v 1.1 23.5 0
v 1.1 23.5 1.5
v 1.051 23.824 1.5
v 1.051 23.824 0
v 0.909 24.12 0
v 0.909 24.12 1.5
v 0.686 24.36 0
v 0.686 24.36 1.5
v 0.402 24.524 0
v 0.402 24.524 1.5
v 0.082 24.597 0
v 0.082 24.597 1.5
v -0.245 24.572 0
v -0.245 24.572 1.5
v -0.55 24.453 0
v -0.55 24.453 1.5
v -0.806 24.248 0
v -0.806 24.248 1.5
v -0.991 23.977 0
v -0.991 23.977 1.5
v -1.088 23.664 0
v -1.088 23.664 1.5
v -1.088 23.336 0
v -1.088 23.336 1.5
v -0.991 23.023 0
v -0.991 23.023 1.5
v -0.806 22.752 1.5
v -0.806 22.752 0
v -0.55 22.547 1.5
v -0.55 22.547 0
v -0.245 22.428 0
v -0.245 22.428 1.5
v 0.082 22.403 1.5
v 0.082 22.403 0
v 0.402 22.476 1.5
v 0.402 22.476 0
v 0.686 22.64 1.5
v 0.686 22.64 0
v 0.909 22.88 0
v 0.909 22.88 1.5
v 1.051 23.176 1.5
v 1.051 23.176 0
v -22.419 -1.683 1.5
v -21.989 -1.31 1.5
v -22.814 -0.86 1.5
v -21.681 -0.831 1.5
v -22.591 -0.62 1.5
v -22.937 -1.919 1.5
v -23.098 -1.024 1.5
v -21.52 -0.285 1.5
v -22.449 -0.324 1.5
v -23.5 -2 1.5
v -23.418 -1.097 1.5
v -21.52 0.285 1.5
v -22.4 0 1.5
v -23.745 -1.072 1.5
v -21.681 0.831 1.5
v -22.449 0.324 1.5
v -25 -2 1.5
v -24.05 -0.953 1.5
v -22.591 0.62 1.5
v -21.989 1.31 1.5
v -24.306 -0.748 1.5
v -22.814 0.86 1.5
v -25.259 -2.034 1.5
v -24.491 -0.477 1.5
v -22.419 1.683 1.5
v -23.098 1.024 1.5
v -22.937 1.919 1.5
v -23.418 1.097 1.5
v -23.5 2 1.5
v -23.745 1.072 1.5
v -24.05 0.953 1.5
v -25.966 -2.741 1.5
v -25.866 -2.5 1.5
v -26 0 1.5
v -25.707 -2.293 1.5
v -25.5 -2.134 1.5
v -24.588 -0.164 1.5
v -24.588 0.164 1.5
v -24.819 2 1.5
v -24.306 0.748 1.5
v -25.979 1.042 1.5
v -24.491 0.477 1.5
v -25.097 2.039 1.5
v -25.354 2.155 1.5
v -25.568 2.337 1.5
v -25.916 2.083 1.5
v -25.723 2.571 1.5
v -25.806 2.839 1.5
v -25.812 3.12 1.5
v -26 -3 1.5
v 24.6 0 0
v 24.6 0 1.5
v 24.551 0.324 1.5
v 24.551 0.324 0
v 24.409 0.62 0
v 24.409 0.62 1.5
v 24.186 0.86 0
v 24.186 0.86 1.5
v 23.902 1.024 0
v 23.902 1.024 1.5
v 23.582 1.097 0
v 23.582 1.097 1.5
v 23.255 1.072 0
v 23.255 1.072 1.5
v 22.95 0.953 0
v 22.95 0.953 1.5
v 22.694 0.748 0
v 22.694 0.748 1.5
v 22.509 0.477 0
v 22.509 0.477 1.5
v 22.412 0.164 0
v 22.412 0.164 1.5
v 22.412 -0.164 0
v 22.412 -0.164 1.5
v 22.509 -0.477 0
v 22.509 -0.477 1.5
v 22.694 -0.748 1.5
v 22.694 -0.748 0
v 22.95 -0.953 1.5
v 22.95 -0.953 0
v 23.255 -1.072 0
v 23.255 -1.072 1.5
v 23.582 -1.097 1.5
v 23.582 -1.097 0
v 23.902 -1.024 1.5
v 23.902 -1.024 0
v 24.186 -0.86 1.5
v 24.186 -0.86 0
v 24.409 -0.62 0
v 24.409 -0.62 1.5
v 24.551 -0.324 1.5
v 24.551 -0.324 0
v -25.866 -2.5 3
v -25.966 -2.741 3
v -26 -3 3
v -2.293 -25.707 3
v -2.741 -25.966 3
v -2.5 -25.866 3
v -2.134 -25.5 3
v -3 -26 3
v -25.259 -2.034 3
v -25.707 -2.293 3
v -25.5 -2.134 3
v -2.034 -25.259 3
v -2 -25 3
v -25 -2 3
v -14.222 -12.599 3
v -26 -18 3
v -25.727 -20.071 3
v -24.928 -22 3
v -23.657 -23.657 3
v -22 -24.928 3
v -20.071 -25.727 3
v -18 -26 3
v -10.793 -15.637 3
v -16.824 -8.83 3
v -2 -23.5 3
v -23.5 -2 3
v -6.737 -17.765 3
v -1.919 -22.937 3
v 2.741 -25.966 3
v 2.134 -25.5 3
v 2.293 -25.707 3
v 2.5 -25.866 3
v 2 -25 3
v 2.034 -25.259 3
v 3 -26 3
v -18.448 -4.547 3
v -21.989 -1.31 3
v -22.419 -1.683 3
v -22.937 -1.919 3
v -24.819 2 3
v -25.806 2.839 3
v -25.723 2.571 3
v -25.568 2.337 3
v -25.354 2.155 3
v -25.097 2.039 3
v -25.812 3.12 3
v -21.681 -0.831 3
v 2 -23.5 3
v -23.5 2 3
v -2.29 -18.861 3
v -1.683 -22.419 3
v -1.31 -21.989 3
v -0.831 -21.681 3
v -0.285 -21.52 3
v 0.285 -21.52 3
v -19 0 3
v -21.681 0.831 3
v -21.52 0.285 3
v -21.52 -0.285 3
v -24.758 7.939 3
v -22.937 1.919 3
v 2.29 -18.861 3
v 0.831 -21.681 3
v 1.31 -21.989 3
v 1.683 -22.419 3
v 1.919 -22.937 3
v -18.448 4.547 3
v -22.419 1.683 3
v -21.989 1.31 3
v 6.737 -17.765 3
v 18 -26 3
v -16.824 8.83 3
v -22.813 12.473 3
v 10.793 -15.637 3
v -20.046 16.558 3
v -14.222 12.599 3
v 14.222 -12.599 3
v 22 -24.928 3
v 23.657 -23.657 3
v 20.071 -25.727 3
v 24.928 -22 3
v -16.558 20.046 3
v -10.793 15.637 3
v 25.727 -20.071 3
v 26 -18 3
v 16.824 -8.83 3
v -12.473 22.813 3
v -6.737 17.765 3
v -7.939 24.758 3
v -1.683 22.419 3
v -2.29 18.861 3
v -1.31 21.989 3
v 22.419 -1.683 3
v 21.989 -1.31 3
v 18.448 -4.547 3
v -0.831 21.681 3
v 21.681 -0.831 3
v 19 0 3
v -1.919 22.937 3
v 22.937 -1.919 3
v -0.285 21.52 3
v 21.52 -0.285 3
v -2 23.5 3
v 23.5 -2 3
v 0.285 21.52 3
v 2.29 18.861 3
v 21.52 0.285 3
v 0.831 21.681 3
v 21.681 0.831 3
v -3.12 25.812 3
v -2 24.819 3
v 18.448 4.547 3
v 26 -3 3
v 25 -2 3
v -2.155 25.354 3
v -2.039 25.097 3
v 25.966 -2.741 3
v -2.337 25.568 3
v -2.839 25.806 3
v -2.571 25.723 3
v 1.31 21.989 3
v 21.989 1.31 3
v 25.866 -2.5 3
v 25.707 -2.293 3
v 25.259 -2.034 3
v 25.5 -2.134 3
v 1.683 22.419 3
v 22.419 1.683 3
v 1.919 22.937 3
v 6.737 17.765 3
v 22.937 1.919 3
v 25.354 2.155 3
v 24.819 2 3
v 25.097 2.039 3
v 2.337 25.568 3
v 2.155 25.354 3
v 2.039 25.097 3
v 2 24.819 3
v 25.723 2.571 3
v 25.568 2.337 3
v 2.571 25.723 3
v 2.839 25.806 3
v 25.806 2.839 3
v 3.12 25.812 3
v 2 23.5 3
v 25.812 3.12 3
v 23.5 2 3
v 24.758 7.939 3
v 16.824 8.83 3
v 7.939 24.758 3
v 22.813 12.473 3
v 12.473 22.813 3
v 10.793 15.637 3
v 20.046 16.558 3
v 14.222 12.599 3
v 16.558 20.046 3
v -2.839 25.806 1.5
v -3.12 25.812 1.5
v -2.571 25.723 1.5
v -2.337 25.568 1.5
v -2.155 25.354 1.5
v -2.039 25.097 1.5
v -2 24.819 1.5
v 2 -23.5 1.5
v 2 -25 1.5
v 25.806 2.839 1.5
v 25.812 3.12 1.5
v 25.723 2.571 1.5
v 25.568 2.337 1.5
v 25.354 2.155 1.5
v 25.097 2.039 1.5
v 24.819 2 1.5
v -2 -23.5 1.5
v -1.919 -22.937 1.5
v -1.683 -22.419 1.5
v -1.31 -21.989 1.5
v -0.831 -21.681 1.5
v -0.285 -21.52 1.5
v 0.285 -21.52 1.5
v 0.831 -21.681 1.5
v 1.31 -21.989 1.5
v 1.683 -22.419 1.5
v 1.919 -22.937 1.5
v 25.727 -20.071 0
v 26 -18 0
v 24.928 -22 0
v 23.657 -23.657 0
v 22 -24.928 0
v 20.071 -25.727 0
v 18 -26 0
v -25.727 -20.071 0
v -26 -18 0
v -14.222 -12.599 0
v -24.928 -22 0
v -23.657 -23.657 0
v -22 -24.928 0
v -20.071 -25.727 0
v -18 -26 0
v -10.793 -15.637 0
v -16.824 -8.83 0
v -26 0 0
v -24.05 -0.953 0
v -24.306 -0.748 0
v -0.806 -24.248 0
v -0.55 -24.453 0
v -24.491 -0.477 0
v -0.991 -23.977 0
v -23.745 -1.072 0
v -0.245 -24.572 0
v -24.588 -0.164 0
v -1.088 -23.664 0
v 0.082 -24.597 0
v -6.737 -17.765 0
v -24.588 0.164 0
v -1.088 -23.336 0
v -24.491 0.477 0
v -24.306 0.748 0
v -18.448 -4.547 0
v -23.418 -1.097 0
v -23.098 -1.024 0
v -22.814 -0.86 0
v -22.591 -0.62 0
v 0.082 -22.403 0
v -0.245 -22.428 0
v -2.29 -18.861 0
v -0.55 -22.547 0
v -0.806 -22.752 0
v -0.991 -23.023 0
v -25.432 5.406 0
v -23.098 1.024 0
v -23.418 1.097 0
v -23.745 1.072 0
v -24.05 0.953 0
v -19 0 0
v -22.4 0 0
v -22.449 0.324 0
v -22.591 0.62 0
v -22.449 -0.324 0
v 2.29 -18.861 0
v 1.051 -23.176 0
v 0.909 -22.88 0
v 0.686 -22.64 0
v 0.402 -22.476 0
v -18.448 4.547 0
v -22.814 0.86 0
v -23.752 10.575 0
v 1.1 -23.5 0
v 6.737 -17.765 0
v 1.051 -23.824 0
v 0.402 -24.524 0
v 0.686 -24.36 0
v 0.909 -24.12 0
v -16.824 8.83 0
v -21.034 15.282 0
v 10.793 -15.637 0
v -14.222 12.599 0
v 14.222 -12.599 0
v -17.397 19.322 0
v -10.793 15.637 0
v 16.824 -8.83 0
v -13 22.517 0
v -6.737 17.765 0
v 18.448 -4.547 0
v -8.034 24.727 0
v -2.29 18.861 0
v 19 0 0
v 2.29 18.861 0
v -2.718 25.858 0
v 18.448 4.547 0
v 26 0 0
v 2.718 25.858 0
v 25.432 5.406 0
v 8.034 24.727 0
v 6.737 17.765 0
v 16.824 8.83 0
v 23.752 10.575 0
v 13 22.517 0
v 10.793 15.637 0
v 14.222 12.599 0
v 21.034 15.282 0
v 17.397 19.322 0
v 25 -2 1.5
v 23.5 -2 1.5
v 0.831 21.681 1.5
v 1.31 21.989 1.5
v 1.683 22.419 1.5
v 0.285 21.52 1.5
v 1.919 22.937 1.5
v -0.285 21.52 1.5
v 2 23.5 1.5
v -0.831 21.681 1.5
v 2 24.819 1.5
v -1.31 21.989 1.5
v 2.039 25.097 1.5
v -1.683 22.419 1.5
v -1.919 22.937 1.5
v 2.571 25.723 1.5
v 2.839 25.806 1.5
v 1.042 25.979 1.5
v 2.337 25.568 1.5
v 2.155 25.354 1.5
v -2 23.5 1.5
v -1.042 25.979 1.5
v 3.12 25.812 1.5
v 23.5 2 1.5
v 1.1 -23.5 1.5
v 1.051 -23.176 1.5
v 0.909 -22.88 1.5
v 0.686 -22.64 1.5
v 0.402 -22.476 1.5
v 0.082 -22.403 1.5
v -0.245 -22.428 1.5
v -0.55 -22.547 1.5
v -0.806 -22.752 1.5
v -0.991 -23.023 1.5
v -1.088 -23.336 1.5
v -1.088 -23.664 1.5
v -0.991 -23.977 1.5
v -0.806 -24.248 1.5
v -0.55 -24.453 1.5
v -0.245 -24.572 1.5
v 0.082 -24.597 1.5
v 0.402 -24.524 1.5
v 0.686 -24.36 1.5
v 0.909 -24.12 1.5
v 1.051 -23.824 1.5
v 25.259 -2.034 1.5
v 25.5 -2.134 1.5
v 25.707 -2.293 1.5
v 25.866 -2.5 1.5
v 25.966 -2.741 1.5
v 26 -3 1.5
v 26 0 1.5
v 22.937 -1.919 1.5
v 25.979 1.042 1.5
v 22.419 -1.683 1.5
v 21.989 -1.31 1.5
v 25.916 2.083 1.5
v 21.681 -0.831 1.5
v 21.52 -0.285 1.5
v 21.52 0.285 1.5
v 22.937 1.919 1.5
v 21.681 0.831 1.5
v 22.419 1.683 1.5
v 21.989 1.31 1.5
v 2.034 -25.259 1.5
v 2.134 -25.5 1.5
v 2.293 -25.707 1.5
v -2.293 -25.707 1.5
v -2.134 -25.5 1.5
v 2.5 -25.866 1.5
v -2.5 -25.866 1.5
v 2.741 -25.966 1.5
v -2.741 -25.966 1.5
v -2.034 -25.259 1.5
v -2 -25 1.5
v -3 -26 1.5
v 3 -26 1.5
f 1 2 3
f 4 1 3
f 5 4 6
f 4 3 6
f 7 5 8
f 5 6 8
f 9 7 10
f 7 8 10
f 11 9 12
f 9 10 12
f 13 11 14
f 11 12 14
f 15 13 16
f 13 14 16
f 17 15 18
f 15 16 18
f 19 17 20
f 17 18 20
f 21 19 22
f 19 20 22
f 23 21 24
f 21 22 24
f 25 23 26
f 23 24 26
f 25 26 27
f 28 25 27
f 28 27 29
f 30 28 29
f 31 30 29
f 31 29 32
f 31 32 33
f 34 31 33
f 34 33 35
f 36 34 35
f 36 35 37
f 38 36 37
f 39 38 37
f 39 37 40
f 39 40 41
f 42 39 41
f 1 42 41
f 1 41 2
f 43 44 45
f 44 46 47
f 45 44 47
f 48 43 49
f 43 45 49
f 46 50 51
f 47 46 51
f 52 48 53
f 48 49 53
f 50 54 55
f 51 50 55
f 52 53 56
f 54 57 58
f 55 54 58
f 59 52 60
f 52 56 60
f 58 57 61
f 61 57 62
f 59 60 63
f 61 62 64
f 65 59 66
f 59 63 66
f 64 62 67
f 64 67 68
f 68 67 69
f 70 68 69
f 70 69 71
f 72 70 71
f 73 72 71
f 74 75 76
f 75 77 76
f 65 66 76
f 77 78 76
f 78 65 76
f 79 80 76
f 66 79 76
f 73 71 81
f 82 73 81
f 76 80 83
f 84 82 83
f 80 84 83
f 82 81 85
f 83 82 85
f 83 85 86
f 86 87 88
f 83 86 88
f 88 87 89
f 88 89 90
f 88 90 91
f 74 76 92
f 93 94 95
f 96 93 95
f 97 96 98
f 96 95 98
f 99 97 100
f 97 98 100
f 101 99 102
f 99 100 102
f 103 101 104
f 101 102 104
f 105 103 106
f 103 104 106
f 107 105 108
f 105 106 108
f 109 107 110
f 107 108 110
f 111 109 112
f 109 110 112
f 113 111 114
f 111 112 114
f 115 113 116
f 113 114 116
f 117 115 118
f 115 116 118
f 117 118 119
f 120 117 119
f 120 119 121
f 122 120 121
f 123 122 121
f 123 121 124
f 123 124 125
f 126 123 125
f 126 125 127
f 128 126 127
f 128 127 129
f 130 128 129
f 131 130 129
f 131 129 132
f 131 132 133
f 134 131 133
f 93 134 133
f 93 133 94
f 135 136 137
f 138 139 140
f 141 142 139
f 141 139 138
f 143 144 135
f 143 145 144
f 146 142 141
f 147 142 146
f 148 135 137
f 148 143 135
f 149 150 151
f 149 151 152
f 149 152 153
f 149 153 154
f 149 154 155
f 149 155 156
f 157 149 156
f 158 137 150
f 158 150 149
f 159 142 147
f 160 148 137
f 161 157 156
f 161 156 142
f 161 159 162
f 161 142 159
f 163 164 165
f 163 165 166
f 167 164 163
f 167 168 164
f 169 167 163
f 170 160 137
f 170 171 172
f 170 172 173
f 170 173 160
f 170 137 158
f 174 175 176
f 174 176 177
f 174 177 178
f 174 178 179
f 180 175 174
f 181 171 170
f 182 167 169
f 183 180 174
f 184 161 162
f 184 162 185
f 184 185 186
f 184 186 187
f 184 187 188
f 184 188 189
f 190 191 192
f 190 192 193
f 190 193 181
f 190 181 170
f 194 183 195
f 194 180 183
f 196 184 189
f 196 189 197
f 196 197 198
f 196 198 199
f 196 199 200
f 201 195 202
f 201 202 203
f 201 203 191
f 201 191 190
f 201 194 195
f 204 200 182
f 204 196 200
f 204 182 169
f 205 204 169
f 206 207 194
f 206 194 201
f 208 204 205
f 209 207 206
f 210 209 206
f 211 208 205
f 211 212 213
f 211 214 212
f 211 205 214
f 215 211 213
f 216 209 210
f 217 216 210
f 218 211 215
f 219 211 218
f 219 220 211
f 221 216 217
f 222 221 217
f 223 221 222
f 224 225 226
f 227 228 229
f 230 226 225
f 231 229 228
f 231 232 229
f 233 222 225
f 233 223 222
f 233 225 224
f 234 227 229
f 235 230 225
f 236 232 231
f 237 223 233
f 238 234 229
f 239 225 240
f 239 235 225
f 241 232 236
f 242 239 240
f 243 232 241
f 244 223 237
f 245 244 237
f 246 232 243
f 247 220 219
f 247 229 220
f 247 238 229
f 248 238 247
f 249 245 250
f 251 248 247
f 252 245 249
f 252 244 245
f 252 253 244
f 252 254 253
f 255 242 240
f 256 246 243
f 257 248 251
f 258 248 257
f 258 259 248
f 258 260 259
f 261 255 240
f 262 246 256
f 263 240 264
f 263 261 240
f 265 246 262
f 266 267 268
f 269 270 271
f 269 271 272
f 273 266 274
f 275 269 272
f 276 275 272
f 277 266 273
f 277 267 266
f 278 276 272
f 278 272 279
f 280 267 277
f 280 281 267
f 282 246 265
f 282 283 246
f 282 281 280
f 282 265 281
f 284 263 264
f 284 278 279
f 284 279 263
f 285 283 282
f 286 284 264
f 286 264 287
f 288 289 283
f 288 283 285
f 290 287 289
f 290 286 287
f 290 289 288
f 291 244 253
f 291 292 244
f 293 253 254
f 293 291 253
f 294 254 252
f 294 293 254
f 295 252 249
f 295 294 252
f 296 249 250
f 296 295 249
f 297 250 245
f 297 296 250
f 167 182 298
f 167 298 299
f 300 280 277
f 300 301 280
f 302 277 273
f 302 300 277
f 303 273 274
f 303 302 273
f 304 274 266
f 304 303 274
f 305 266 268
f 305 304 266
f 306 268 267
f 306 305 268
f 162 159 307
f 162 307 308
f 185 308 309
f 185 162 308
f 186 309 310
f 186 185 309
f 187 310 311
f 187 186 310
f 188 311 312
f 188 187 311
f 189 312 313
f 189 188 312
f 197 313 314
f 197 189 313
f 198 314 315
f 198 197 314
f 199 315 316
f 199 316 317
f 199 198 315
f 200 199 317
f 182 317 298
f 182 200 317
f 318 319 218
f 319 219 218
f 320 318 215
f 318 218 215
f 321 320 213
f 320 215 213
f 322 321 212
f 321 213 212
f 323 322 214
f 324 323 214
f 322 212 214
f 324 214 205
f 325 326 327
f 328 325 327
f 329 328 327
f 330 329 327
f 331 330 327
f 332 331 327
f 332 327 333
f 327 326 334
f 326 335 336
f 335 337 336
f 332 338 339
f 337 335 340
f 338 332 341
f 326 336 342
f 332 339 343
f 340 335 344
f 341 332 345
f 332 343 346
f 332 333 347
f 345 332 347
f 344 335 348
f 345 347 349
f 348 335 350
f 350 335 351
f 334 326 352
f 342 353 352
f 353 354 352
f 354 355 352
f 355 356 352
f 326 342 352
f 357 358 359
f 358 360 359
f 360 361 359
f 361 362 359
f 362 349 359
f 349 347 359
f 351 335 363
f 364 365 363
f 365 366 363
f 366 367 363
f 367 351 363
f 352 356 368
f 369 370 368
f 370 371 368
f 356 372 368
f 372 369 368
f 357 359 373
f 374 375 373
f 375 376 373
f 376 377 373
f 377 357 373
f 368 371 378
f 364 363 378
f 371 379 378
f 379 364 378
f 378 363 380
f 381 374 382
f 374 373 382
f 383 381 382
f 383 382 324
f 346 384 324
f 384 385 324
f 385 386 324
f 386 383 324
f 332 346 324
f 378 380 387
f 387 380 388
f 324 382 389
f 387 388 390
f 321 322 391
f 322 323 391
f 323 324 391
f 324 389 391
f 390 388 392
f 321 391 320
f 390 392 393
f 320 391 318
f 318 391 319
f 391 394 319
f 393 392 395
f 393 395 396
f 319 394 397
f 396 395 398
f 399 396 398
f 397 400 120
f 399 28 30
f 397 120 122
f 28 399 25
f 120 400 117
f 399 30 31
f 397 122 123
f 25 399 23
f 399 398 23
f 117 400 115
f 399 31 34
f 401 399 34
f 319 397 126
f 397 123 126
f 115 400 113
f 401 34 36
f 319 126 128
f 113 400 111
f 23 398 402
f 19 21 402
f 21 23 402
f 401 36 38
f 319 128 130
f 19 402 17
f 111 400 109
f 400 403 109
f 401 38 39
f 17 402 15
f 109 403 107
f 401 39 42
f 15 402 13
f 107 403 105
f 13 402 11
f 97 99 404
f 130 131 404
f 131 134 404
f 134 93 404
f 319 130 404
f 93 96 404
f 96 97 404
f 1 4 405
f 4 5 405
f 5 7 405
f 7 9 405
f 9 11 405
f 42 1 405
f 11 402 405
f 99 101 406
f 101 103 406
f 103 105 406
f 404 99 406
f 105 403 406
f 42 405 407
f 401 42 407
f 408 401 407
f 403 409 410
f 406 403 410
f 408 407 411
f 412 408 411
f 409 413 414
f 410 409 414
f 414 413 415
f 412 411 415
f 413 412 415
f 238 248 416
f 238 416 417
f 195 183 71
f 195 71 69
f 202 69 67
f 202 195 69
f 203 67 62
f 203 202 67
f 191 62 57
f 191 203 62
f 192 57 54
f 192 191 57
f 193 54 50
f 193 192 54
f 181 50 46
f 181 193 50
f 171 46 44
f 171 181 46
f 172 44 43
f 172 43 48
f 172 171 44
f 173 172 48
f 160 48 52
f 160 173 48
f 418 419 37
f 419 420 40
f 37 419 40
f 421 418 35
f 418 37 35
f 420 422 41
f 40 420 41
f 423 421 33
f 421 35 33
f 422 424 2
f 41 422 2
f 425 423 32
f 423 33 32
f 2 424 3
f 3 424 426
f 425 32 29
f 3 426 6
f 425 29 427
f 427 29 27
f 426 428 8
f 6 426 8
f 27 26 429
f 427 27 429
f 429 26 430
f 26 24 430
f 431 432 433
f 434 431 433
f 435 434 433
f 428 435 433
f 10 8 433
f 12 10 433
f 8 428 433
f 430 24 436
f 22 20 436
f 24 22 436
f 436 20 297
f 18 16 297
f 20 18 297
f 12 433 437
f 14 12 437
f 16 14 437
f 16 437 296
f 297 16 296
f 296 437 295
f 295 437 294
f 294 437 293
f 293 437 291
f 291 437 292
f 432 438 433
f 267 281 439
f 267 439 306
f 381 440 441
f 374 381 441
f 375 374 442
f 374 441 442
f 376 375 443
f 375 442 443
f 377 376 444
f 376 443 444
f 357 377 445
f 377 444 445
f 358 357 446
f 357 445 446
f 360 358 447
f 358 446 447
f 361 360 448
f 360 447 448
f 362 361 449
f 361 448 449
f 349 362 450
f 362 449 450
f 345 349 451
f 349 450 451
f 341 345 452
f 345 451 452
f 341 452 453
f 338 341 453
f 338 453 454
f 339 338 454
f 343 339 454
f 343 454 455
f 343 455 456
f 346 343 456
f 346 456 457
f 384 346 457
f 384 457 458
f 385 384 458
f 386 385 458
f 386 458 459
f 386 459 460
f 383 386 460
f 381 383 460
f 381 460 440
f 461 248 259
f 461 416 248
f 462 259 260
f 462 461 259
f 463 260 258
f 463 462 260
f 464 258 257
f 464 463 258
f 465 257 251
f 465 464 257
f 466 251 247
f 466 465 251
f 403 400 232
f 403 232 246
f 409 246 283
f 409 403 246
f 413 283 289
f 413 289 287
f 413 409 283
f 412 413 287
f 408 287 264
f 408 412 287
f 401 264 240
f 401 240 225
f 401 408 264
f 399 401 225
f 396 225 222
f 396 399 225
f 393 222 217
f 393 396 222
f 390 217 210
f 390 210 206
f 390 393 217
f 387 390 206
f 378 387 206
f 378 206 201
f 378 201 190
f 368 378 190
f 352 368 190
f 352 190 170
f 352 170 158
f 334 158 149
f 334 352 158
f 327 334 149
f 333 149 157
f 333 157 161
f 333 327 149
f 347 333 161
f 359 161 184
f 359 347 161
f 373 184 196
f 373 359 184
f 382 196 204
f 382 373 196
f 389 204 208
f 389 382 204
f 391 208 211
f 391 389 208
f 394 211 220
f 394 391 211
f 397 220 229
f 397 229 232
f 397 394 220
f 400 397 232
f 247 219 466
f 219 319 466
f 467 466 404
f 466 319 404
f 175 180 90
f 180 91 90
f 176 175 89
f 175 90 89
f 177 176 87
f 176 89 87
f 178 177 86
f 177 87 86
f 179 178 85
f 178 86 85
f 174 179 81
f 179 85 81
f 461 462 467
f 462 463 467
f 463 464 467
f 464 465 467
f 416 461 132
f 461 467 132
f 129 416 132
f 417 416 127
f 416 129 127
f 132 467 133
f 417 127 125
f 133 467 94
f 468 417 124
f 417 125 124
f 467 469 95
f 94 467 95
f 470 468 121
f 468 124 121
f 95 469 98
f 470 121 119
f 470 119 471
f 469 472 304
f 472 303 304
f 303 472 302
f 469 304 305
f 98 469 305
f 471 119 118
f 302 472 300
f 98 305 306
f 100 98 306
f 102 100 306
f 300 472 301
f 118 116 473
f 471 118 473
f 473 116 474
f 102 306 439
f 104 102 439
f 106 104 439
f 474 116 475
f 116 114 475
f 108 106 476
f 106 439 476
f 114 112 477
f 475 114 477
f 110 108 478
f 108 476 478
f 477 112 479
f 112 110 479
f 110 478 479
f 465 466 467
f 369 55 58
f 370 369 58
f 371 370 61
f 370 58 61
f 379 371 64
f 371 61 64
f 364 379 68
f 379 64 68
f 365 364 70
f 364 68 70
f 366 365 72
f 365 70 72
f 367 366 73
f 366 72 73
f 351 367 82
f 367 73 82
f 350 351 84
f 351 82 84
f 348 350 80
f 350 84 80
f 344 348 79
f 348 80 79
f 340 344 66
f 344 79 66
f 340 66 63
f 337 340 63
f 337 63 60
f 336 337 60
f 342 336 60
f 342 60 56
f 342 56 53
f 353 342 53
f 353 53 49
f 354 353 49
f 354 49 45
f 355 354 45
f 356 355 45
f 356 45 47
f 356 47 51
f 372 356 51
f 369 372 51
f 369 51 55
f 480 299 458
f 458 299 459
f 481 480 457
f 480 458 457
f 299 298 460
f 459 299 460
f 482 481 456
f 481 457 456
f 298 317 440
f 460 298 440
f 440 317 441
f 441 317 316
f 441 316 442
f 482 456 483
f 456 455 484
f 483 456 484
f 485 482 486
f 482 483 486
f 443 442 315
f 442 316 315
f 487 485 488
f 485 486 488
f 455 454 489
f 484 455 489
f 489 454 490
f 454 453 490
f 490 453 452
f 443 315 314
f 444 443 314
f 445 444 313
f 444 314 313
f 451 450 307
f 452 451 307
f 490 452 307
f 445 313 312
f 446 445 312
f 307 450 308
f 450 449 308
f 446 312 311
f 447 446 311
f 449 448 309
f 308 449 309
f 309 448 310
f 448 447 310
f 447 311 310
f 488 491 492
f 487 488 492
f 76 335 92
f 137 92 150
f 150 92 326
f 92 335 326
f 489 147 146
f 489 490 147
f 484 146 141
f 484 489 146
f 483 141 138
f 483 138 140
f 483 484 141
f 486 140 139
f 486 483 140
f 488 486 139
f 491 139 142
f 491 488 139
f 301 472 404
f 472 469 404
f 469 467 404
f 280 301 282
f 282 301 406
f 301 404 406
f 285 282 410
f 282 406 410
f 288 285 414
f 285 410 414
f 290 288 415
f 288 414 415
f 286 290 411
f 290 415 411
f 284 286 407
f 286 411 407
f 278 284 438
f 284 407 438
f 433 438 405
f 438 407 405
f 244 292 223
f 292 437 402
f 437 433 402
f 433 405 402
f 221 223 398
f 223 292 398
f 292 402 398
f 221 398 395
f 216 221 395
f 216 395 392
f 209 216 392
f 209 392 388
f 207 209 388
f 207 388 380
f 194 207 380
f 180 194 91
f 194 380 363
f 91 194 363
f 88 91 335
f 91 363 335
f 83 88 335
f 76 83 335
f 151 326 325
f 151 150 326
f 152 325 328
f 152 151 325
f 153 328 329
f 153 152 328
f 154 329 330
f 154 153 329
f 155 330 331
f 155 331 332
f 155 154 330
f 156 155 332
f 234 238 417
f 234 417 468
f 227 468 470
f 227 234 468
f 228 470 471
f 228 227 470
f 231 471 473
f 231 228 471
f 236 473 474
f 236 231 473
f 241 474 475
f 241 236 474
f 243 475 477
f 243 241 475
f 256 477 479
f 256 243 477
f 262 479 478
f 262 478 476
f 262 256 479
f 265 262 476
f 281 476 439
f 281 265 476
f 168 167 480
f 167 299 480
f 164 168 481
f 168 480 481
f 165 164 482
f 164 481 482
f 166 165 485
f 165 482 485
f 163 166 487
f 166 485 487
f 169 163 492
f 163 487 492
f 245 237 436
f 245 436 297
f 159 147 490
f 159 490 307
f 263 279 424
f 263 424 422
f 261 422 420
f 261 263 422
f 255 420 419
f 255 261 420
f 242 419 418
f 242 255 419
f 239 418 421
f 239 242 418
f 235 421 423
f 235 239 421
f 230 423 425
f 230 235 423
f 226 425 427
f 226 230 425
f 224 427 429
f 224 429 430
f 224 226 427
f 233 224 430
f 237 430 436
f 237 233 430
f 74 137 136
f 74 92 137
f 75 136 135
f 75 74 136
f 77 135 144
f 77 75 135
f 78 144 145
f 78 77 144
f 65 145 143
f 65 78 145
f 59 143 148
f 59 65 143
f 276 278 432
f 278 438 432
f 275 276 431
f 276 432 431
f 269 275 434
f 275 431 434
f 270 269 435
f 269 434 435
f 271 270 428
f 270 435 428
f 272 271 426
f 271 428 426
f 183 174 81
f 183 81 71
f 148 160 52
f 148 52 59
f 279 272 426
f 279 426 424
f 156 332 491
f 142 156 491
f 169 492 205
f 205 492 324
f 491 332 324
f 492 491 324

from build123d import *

# Parameters (mm, degrees)
SKETCH_1_R          = 19
EXTRUDE_1_DEPTH     = 3
SKETCH_2_R          = 1.1
CUT_EXTRUDE_1_DEPTH = 37.891733491
CUT_EXTRUDE_2_DEPTH = 1.5
FILLET_1_R          = 1
FILLET_2_R          = 8


with BuildPart() as part:
    # Эскиз1 → Бобышка-Вытянуть1 (new body)
    with BuildSketch(Plane.XY):
        with BuildLine():
            Line((-26, 0), (-26, -26))
            Line((-26, -26), (26, -26))
            Line((26, -26), (26, 0))
            ThreePointArc((26, 0), (0, 26), (-26, 0))
        make_face()
        Circle(SKETCH_1_R, mode=Mode.SUBTRACT)
    extrude(amount=EXTRUDE_1_DEPTH)

    # Эскиз2 → Вырез-Вытянуть1 (cut, through all)
    with BuildSketch(Plane.XY.offset(3)):
        with Locations((0, 23.5)):
            Circle(SKETCH_2_R)
        with Locations((23.5, 0)):
            Circle(SKETCH_2_R)
        with Locations((0, -23.5)):
            Circle(SKETCH_2_R)
        with Locations((-23.5, 0)):
            Circle(SKETCH_2_R)
    extrude(amount=-CUT_EXTRUDE_1_DEPTH, mode=Mode.SUBTRACT)

    # Эскиз3 → Вырез-Вытянуть2 (cut)
    with BuildSketch(Plane.XY.offset(3)):
        with BuildLine():
            Line((-2, 23.5), (-2, 26))
            Line((-2, 26), (2, 26))
            Line((2, 26), (2, 23.5))
            ThreePointArc((2, 23.5), (0, 21.5), (-2, 23.5))
        make_face()
        with BuildLine():
            Line((26, -2), (23.5, -2))
            ThreePointArc((23.5, -2), (21.5, 0), (23.5, 2))
            Line((23.5, 2), (26, 2))
            Line((26, 2), (26, -2))
        make_face()
        with BuildLine():
            Line((-2, -26), (-2, -23.5))
            ThreePointArc((-2, -23.5), (0, -21.5), (2, -23.5))
            Line((2, -23.5), (2, -26))
            Line((2, -26), (-2, -26))
        make_face()
        with BuildLine():
            Line((-26, 2), (-23.5, 2))
            ThreePointArc((-23.5, 2), (-21.5, 0), (-23.5, -2))
            Line((-23.5, -2), (-26, -2))
            Line((-26, -2), (-26, 2))
        make_face()
    extrude(amount=-CUT_EXTRUDE_2_DEPTH, mode=Mode.SUBTRACT)

    # Скругление1
    fillet_1_edges = [part.edges().sort_by_distance(p)[0] for p in [
        (-25.922962794, 2, 2.25),
        (25.922962794, 2, 2.25),
        (2, 25.922962794, 2.25),
        (-2, 25.922962794, 2.25),
        (26, -2, 2.25),
        (2, -26, 2.25),
        (-2, -26, 2.25),
        (-26, -2, 2.25),
    ]]
    fillet(fillet_1_edges, radius=FILLET_1_R)

    # Скругление2
    fillet_2_edges = [part.edges().sort_by_distance(p)[0] for p in [
        (26, -26, 1.5),
        (-26, -26, 1.5),
    ]]
    fillet(fillet_2_edges, radius=FILLET_2_R)


solid = part.part
